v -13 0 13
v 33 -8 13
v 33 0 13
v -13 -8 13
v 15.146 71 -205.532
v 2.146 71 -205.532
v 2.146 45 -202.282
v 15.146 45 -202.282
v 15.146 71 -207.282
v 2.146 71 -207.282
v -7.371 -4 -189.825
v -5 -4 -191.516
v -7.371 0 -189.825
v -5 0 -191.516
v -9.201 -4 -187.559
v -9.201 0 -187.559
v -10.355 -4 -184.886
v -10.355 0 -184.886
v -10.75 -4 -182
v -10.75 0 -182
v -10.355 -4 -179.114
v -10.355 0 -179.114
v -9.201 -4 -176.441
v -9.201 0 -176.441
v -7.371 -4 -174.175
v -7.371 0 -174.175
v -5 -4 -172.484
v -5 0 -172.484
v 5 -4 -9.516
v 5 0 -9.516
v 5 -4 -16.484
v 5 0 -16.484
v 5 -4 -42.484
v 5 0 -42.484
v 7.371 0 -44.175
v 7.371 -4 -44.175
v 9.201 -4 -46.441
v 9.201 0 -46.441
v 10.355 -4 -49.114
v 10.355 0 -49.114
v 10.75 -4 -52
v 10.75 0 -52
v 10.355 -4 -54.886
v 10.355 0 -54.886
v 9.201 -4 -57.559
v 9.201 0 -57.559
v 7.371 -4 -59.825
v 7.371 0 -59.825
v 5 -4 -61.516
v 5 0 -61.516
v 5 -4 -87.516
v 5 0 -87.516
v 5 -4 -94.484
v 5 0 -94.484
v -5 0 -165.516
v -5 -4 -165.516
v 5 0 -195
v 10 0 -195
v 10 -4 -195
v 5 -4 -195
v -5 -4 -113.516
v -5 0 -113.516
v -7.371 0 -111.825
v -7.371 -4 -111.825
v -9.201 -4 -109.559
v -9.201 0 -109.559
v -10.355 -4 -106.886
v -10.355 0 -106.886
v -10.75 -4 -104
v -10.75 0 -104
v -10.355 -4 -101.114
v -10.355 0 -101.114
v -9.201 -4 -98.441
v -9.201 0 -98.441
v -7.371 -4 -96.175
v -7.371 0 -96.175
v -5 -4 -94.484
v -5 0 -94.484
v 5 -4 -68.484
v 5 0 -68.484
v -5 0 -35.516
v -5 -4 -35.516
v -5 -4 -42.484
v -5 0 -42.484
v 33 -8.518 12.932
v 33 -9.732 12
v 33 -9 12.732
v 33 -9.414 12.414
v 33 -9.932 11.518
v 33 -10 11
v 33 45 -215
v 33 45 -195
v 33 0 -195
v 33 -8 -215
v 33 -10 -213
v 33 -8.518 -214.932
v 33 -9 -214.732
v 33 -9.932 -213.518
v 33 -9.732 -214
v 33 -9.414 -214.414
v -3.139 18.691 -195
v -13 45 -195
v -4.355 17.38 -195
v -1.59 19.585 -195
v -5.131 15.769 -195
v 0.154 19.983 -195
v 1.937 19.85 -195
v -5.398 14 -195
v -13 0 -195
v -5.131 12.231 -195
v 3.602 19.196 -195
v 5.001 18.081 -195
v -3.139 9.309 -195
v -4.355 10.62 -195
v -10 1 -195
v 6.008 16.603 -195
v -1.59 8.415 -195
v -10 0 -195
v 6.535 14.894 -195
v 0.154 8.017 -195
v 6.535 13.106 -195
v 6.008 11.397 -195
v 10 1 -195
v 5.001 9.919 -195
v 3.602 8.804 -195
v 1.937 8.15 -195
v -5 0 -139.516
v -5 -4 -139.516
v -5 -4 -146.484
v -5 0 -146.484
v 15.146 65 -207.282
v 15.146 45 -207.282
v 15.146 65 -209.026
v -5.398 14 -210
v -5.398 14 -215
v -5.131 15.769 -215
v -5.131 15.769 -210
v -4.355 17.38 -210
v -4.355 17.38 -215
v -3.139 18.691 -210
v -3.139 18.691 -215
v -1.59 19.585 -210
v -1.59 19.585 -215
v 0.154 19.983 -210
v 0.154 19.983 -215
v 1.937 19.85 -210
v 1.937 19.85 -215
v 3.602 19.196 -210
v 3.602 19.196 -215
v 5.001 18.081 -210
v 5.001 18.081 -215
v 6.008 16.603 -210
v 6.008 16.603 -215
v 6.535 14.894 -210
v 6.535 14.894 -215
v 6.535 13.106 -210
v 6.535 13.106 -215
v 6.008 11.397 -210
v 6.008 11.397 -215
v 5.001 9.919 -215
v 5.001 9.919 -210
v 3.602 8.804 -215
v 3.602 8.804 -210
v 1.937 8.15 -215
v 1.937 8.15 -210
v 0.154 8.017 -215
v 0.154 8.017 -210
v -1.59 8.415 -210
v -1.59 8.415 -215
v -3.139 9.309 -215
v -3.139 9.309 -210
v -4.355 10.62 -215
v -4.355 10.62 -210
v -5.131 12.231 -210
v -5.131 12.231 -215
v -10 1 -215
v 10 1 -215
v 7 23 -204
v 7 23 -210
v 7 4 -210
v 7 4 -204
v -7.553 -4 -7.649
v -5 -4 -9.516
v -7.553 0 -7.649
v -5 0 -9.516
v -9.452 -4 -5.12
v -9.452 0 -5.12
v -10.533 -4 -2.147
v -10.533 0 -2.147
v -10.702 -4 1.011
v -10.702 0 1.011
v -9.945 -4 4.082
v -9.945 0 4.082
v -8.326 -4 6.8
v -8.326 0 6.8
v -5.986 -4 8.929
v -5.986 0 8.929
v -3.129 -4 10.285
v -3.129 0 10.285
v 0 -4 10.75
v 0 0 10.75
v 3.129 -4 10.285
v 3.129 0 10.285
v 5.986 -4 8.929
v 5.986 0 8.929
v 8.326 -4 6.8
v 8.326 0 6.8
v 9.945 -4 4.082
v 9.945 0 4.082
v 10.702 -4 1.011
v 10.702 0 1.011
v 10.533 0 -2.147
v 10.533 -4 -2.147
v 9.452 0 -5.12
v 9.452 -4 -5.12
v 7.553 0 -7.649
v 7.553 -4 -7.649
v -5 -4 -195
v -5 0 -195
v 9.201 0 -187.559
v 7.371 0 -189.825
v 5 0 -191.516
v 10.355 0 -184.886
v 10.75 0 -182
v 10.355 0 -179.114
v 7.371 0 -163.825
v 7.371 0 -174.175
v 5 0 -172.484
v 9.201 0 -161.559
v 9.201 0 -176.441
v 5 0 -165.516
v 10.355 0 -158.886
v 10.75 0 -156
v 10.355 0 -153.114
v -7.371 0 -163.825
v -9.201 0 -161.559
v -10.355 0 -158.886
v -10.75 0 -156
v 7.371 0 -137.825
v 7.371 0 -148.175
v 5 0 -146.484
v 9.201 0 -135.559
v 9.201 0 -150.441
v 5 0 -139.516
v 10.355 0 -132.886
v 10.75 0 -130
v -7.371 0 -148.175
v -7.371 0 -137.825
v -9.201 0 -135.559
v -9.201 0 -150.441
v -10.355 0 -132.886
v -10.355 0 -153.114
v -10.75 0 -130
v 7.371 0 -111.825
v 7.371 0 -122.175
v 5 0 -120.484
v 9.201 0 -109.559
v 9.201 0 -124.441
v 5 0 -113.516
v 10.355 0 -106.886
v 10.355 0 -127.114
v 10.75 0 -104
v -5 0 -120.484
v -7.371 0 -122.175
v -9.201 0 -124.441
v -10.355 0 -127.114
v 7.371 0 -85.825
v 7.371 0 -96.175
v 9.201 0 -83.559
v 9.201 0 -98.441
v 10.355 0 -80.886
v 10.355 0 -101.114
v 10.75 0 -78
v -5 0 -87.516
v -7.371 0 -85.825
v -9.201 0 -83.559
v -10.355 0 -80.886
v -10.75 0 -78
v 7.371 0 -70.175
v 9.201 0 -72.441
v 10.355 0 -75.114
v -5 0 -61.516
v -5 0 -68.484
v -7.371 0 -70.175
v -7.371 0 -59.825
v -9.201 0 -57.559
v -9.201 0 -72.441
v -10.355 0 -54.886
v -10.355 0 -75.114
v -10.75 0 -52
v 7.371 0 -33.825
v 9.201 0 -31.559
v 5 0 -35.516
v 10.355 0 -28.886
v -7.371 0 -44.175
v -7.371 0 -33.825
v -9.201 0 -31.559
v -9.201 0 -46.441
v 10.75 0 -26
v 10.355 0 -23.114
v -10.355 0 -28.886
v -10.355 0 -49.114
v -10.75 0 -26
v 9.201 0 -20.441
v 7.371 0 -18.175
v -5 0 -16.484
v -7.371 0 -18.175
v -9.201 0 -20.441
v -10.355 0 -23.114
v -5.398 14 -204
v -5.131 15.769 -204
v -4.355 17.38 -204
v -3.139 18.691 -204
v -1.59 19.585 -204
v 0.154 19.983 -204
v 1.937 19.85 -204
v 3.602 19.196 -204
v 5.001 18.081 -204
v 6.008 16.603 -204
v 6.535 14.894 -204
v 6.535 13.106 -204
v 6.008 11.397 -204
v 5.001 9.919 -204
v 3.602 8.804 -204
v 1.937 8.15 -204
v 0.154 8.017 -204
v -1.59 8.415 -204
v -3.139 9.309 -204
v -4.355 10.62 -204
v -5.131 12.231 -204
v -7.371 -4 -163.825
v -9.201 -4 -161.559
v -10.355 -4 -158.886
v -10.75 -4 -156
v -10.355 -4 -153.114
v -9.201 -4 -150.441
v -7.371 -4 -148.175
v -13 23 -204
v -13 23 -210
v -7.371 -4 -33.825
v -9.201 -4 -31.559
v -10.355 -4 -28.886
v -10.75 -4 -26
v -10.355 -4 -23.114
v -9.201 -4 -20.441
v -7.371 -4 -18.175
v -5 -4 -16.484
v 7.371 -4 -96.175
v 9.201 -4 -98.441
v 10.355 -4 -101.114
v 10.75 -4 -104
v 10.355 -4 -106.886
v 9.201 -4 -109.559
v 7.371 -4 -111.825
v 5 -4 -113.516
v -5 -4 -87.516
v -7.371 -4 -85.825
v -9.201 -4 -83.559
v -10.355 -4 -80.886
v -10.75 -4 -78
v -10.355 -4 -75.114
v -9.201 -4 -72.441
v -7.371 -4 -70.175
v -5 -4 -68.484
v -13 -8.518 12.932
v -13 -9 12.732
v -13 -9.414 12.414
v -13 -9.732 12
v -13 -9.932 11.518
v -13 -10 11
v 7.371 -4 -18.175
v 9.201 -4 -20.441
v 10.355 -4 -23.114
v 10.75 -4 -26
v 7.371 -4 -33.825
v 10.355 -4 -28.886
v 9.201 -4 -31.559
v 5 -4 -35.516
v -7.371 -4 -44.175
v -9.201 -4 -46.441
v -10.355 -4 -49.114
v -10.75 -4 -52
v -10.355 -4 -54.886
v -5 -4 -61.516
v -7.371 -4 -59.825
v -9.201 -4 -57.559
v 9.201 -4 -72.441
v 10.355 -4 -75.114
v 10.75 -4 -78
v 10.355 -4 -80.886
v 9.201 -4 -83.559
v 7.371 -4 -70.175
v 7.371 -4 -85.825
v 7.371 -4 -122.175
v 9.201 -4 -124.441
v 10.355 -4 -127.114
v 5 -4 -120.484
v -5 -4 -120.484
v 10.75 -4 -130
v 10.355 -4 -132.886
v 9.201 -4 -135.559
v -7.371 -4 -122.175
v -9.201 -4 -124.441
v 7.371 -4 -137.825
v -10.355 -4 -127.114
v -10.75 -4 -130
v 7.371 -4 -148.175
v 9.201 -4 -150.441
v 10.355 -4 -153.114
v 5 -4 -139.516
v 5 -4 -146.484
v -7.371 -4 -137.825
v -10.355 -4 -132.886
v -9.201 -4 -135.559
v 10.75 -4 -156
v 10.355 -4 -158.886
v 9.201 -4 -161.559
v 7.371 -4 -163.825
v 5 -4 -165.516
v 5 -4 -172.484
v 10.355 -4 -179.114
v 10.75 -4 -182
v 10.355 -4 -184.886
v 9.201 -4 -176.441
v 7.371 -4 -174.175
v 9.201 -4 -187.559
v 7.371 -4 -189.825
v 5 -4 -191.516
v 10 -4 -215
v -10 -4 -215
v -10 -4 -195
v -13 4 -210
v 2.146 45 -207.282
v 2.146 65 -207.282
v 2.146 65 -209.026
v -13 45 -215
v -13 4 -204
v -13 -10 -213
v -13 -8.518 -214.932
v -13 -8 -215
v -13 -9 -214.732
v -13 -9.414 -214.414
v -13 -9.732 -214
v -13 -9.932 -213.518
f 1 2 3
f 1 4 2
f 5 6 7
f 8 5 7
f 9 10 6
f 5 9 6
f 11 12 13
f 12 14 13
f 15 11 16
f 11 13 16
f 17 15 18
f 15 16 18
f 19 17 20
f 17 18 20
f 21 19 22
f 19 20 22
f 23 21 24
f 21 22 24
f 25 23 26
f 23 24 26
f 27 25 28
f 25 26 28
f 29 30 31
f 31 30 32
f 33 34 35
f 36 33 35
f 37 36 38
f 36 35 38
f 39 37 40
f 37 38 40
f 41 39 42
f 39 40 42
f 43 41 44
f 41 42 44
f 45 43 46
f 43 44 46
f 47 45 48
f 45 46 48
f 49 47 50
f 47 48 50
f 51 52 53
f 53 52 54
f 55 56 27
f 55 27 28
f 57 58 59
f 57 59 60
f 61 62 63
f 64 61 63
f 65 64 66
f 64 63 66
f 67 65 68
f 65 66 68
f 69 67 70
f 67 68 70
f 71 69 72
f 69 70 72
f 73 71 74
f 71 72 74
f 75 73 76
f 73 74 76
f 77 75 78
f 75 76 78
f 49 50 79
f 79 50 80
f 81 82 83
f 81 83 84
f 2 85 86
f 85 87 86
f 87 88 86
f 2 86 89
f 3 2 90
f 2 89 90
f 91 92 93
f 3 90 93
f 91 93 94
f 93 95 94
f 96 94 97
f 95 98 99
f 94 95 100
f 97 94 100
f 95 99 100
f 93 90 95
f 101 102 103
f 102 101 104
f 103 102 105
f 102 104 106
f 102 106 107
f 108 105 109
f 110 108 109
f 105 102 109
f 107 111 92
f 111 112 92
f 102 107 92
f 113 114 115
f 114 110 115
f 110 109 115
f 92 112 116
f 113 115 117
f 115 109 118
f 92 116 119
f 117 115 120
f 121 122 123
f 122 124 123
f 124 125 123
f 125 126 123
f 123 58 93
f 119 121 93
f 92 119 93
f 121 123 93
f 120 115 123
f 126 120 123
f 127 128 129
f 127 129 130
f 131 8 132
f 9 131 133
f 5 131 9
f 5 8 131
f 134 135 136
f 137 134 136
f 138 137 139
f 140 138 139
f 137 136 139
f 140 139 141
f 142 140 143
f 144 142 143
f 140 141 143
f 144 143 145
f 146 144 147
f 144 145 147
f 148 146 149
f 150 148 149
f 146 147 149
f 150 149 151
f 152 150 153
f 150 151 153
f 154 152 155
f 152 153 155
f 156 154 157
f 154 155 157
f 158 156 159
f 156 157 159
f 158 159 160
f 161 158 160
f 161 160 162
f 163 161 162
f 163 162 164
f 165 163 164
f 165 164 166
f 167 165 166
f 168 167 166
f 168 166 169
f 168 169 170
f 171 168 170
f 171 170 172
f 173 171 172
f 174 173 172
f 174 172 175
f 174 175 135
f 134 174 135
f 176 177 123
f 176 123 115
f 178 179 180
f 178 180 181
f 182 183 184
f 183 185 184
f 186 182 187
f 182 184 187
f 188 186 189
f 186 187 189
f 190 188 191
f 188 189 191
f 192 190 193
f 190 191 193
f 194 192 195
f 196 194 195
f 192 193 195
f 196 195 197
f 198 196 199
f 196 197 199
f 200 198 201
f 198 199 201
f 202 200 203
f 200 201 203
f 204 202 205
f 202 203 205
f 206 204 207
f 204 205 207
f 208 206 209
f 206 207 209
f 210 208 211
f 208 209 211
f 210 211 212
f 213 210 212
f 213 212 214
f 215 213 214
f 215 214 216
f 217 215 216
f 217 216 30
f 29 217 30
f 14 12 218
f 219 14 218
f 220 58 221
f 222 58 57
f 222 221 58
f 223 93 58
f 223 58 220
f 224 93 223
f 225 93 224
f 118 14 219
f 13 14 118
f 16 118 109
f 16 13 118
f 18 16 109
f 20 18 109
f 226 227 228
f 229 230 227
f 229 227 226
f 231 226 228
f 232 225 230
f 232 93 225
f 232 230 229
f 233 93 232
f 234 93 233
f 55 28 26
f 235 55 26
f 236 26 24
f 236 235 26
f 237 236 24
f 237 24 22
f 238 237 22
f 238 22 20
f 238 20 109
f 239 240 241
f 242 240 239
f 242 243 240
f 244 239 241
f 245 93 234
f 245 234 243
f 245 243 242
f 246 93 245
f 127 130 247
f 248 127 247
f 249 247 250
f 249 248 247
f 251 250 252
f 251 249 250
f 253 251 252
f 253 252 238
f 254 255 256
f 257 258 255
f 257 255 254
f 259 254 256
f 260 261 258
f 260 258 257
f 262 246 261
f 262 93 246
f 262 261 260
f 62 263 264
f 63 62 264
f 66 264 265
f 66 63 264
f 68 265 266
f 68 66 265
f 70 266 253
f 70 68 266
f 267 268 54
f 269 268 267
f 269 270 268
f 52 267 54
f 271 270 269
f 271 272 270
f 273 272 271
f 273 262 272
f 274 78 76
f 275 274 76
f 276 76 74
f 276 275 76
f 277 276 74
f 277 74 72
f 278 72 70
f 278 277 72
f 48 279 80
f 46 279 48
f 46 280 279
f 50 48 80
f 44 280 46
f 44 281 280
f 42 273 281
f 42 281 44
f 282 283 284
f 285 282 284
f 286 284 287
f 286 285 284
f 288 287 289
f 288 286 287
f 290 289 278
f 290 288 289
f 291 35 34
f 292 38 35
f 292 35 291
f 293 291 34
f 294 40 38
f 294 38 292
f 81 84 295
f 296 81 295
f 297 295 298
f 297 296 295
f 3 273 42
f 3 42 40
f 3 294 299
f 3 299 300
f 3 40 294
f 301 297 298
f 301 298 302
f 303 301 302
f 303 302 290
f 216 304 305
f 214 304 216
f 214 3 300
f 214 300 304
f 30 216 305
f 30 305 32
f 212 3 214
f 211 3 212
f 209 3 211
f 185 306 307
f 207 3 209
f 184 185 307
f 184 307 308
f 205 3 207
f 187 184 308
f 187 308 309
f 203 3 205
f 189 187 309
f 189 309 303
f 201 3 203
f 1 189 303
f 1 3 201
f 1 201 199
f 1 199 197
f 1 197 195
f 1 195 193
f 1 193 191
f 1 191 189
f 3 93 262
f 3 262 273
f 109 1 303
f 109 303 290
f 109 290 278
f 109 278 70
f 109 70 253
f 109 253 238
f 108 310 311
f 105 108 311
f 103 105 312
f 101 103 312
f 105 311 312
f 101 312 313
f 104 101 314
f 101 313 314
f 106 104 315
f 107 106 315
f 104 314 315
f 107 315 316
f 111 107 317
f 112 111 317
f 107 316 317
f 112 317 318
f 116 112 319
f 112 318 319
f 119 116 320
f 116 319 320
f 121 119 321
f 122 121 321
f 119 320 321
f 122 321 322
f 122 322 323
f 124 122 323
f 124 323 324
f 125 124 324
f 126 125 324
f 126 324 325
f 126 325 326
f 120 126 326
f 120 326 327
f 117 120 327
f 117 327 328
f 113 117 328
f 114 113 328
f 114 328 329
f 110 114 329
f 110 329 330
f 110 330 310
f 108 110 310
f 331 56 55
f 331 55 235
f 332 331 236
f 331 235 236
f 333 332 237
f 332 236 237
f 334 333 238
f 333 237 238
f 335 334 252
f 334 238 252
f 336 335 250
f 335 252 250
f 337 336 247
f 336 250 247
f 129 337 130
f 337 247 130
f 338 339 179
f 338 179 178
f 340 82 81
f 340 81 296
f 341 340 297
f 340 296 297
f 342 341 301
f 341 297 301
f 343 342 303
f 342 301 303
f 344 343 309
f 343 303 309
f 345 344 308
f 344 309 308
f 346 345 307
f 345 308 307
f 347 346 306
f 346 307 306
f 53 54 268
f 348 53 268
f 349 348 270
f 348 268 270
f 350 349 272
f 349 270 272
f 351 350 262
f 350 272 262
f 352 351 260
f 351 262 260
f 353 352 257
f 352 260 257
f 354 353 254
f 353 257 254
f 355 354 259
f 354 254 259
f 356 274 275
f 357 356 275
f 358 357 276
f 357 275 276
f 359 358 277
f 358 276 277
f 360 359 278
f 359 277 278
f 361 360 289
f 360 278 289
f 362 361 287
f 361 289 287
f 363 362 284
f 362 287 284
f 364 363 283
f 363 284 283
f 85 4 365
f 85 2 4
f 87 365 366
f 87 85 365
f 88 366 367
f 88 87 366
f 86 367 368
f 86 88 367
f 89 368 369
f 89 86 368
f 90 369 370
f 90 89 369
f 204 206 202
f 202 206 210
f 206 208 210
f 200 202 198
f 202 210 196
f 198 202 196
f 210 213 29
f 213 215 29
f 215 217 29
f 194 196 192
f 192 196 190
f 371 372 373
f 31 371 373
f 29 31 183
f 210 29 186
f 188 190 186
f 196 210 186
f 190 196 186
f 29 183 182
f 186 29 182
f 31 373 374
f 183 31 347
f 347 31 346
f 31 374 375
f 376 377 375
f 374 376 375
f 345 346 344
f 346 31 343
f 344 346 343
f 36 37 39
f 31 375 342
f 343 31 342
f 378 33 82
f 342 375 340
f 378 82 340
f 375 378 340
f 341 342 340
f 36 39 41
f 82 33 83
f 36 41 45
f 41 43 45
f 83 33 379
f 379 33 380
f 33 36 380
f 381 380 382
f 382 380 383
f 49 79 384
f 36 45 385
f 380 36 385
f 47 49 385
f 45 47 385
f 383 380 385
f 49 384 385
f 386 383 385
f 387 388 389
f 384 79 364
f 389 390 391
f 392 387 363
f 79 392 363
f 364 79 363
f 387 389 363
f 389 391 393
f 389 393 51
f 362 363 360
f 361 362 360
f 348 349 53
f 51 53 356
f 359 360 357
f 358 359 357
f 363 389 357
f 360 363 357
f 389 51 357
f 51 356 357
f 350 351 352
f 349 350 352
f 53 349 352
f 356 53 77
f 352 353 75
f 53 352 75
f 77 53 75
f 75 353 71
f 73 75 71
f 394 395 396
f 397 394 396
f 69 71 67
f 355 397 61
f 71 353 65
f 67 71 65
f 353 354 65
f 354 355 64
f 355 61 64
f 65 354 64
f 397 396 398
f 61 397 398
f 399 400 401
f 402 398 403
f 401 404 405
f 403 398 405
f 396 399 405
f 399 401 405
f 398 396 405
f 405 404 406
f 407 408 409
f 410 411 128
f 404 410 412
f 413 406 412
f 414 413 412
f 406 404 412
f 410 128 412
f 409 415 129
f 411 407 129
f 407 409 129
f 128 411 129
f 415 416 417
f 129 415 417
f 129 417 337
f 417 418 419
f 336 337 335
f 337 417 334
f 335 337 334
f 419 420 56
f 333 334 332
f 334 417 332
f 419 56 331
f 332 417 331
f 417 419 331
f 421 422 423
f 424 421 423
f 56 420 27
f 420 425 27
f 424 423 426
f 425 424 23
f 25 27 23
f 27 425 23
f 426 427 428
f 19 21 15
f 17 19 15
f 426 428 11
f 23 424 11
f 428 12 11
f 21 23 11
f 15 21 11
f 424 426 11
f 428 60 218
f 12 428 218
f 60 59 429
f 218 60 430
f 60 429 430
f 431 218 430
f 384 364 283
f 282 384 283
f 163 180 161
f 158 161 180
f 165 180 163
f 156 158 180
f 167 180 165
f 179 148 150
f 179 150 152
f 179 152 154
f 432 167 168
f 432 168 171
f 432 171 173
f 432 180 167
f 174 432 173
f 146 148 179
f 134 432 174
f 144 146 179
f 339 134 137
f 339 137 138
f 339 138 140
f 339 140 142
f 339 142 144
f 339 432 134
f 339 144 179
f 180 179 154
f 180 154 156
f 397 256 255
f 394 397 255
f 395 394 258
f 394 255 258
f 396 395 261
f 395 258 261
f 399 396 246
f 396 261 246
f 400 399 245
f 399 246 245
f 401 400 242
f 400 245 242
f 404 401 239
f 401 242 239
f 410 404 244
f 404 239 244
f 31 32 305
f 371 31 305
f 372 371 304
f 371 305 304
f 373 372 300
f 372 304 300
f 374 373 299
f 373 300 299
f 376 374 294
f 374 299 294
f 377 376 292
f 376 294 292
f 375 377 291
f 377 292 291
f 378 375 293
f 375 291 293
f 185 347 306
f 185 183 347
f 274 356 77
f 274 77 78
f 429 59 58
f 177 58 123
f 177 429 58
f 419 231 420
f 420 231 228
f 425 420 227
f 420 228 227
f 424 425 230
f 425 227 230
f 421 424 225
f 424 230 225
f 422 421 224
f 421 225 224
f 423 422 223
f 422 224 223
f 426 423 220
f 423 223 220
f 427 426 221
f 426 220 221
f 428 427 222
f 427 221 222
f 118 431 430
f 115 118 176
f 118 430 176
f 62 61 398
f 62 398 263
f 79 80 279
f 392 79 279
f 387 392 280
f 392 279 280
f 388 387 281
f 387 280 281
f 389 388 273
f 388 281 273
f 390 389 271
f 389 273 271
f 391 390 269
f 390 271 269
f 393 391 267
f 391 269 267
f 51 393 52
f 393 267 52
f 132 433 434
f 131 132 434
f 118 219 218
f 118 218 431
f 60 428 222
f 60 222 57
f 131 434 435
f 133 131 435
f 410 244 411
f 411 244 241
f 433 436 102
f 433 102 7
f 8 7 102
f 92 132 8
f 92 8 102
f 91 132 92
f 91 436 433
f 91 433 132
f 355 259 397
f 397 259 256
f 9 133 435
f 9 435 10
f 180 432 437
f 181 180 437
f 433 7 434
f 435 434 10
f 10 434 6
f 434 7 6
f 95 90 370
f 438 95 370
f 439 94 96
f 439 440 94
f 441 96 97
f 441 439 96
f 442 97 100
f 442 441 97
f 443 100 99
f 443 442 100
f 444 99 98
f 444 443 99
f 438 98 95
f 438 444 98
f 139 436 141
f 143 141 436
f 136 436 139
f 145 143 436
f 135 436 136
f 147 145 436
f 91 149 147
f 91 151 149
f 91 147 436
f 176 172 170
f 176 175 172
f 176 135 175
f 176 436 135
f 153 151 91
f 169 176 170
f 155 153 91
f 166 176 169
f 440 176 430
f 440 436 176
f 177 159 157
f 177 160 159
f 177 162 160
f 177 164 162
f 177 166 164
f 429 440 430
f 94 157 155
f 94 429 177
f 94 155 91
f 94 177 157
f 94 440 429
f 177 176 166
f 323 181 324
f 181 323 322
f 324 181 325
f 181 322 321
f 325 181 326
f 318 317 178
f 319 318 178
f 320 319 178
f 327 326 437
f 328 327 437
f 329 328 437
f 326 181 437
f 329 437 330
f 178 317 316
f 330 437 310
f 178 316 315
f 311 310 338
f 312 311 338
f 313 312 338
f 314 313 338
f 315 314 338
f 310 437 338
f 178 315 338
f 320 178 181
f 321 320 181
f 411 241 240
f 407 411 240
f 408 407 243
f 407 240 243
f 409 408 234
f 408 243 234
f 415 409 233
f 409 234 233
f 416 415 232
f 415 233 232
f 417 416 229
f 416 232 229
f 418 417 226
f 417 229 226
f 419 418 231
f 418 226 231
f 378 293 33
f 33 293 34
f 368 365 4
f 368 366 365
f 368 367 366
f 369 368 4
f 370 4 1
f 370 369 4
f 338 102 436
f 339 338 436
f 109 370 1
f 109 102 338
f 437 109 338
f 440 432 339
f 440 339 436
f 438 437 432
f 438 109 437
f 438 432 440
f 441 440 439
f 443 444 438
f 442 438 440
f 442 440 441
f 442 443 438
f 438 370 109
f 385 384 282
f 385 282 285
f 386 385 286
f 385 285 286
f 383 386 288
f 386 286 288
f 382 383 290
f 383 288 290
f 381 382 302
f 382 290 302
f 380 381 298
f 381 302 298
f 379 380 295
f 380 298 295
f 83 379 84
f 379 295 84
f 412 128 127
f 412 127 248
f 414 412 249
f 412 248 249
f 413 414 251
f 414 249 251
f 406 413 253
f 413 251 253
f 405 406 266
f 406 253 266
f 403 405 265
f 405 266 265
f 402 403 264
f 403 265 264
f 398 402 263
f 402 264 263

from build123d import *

# Parameters (mm, degrees)
SKETCH5_W           = 26
SKETCH5_H           = 26
BOSS_EXTRUDE1_DEPTH = 10
SKETCH4_R           = 10.75
CUT_EXTRUDE1_DEPTH  = 4
SKETCH6_W           = 10
SKETCH6_H           = 3.483566845
CUT_EXTRUDE2_DEPTH  = 4
LPATTERN1_COUNT     = 8
LPATTERN1_PITCH     = 26
SKETCH7_W           = 10
SKETCH7_H           = 4
CUT_EXTRUDE3_DEPTH  = 183.737516674
SKETCH12_W          = 208
SKETCH12_H          = 10
BOSS_EXTRUDE3_DEPTH = 20
SKETCH14_W          = 46
SKETCH14_H          = 10
BOSS_EXTRUDE4_DEPTH = 20
SKETCH15_W          = 46
SKETCH15_H          = 20
BOSS_EXTRUDE5_DEPTH = 45
SKETCH16_W          = 20
SKETCH16_H          = 5
CUT_EXTRUDE5_DEPTH  = 20
SKETCH17_R          = 6
CUT_EXTRUDE6_DEPTH  = 45
SKETCH18_W          = 6
SKETCH18_H          = 19
CUT_EXTRUDE7_DEPTH  = 20
SNAP_START          = 2.145910006
SNAP_HOOK1_DEPTH    = 13
FILLET2_R           = 2


# Read off the part's stored shape, not the designer's step: Snap Hook1
with BuildPart() as part:
    # Sketch5 → Boss-Extrude1 (new body)
    with BuildSketch(Plane(origin=(0, 0, 0), x_dir=(1, 0, 0), z_dir=(0, 1, 0))):
        Rectangle(SKETCH5_W, SKETCH5_H)
    boss_extrude1 = extrude(amount=-BOSS_EXTRUDE1_DEPTH)

    # Sketch4 → Cut-Extrude1 (cut)
    with BuildSketch(Plane(origin=(0, 0, 0), x_dir=(1, 0, 0), z_dir=(0, 1, 0))):
        with Locations(Location((0, 0, 0), (0, 0, 270))):
            Circle(SKETCH4_R)
    cut_extrude1 = extrude(amount=-CUT_EXTRUDE1_DEPTH, mode=Mode.SUBTRACT)

    # Sketch6 → Cut-Extrude2 (cut)
    with BuildSketch(Plane(origin=(0, 0, 0), x_dir=(1, 0, 0), z_dir=(0, 1, 0))):
        with Locations((0, 11.258216578)):
            Rectangle(SKETCH6_W, SKETCH6_H)
    cut_extrude2 = extrude(amount=-CUT_EXTRUDE2_DEPTH, mode=Mode.SUBTRACT)

    # LPattern1: Boss-Extrude1, Cut-Extrude1, Cut-Extrude2 ×8
    with Locations(*[(0, 0, -i * LPATTERN1_PITCH) for i in range(1, LPATTERN1_COUNT)]):
        add(boss_extrude1)
        add(cut_extrude1, mode=Mode.SUBTRACT)
        add(cut_extrude2, mode=Mode.SUBTRACT)

    # Sketch7 → Cut-Extrude3 (cut, through all)
    with BuildSketch(Plane.XY.offset(-13)):
        with Locations((0, -2)):
            Rectangle(SKETCH7_W, SKETCH7_H)
    extrude(amount=-CUT_EXTRUDE3_DEPTH, mode=Mode.SUBTRACT)

    # Sketch12 → Boss-Extrude3 (add)
    with BuildSketch(Plane(origin=(13, 0, 0), x_dir=(0, 0, -1), z_dir=(1, 0, 0))):
        with Locations((91, -5)):
            Rectangle(SKETCH12_W, SKETCH12_H)
    extrude(amount=BOSS_EXTRUDE3_DEPTH)

    # Sketch14 → Boss-Extrude4 (add)
    with BuildSketch(Plane(origin=(0, 0, -195), x_dir=(-1, 0, 0), z_dir=(0, 0, -1))):
        with Locations((-10, -5)):
            Rectangle(SKETCH14_W, SKETCH14_H)
    extrude(amount=BOSS_EXTRUDE4_DEPTH)

    # Sketch15 → Boss-Extrude5 (add)
    with BuildSketch(Plane(origin=(0, 0, 0), x_dir=(1, 0, 0), z_dir=(0, 1, 0))):
        with Locations((10, 205)):
            Rectangle(SKETCH15_W, SKETCH15_H)
    extrude(amount=BOSS_EXTRUDE5_DEPTH)

    # Sketch16 → Cut-Extrude5 (cut)
    with BuildSketch(Plane(origin=(0, 0, -215), x_dir=(-1, 0, 0), z_dir=(0, 0, -1))):
        with Locations((0, -1.5)):
            Rectangle(SKETCH16_W, SKETCH16_H)
    extrude(amount=-CUT_EXTRUDE5_DEPTH, mode=Mode.SUBTRACT)

    # Sketch17 → Cut-Extrude6 (cut)
    with BuildSketch(Plane(origin=(0, 0, -215), x_dir=(-1, 0, 0), z_dir=(0, 0, -1))):
        with Locations((-0.602201255, 14)):
            Circle(SKETCH17_R)
    extrude(amount=-CUT_EXTRUDE6_DEPTH, mode=Mode.SUBTRACT)

    # Sketch18 → Cut-Extrude7 (cut)
    with BuildSketch(Plane.ZY.offset(13)):
        with Locations((-207, 13.5)):
            Rectangle(SKETCH18_W, SKETCH18_H)
    extrude(amount=-CUT_EXTRUDE7_DEPTH, mode=Mode.SUBTRACT)

    # Snap Hook1 outline → Snap Hook1 (add)
    with BuildSketch(Plane.YZ.offset(SNAP_START)):
        Polygon((45, -207.281762619), (65, -207.281762619), (65, -209.025762619), (71, -207.281762619), (71, -205.531762619), (45, -202.281762619), align=None)
    extrude(amount=SNAP_HOOK1_DEPTH)

    # Fillet2
    fillet2_edges = [part.edges().sort_by_distance(p)[0] for p in [
        (10, -10, -215),
        (10, -10, 13),
    ]]
    fillet(fillet2_edges, radius=FILLET2_R)


solid = part.part
